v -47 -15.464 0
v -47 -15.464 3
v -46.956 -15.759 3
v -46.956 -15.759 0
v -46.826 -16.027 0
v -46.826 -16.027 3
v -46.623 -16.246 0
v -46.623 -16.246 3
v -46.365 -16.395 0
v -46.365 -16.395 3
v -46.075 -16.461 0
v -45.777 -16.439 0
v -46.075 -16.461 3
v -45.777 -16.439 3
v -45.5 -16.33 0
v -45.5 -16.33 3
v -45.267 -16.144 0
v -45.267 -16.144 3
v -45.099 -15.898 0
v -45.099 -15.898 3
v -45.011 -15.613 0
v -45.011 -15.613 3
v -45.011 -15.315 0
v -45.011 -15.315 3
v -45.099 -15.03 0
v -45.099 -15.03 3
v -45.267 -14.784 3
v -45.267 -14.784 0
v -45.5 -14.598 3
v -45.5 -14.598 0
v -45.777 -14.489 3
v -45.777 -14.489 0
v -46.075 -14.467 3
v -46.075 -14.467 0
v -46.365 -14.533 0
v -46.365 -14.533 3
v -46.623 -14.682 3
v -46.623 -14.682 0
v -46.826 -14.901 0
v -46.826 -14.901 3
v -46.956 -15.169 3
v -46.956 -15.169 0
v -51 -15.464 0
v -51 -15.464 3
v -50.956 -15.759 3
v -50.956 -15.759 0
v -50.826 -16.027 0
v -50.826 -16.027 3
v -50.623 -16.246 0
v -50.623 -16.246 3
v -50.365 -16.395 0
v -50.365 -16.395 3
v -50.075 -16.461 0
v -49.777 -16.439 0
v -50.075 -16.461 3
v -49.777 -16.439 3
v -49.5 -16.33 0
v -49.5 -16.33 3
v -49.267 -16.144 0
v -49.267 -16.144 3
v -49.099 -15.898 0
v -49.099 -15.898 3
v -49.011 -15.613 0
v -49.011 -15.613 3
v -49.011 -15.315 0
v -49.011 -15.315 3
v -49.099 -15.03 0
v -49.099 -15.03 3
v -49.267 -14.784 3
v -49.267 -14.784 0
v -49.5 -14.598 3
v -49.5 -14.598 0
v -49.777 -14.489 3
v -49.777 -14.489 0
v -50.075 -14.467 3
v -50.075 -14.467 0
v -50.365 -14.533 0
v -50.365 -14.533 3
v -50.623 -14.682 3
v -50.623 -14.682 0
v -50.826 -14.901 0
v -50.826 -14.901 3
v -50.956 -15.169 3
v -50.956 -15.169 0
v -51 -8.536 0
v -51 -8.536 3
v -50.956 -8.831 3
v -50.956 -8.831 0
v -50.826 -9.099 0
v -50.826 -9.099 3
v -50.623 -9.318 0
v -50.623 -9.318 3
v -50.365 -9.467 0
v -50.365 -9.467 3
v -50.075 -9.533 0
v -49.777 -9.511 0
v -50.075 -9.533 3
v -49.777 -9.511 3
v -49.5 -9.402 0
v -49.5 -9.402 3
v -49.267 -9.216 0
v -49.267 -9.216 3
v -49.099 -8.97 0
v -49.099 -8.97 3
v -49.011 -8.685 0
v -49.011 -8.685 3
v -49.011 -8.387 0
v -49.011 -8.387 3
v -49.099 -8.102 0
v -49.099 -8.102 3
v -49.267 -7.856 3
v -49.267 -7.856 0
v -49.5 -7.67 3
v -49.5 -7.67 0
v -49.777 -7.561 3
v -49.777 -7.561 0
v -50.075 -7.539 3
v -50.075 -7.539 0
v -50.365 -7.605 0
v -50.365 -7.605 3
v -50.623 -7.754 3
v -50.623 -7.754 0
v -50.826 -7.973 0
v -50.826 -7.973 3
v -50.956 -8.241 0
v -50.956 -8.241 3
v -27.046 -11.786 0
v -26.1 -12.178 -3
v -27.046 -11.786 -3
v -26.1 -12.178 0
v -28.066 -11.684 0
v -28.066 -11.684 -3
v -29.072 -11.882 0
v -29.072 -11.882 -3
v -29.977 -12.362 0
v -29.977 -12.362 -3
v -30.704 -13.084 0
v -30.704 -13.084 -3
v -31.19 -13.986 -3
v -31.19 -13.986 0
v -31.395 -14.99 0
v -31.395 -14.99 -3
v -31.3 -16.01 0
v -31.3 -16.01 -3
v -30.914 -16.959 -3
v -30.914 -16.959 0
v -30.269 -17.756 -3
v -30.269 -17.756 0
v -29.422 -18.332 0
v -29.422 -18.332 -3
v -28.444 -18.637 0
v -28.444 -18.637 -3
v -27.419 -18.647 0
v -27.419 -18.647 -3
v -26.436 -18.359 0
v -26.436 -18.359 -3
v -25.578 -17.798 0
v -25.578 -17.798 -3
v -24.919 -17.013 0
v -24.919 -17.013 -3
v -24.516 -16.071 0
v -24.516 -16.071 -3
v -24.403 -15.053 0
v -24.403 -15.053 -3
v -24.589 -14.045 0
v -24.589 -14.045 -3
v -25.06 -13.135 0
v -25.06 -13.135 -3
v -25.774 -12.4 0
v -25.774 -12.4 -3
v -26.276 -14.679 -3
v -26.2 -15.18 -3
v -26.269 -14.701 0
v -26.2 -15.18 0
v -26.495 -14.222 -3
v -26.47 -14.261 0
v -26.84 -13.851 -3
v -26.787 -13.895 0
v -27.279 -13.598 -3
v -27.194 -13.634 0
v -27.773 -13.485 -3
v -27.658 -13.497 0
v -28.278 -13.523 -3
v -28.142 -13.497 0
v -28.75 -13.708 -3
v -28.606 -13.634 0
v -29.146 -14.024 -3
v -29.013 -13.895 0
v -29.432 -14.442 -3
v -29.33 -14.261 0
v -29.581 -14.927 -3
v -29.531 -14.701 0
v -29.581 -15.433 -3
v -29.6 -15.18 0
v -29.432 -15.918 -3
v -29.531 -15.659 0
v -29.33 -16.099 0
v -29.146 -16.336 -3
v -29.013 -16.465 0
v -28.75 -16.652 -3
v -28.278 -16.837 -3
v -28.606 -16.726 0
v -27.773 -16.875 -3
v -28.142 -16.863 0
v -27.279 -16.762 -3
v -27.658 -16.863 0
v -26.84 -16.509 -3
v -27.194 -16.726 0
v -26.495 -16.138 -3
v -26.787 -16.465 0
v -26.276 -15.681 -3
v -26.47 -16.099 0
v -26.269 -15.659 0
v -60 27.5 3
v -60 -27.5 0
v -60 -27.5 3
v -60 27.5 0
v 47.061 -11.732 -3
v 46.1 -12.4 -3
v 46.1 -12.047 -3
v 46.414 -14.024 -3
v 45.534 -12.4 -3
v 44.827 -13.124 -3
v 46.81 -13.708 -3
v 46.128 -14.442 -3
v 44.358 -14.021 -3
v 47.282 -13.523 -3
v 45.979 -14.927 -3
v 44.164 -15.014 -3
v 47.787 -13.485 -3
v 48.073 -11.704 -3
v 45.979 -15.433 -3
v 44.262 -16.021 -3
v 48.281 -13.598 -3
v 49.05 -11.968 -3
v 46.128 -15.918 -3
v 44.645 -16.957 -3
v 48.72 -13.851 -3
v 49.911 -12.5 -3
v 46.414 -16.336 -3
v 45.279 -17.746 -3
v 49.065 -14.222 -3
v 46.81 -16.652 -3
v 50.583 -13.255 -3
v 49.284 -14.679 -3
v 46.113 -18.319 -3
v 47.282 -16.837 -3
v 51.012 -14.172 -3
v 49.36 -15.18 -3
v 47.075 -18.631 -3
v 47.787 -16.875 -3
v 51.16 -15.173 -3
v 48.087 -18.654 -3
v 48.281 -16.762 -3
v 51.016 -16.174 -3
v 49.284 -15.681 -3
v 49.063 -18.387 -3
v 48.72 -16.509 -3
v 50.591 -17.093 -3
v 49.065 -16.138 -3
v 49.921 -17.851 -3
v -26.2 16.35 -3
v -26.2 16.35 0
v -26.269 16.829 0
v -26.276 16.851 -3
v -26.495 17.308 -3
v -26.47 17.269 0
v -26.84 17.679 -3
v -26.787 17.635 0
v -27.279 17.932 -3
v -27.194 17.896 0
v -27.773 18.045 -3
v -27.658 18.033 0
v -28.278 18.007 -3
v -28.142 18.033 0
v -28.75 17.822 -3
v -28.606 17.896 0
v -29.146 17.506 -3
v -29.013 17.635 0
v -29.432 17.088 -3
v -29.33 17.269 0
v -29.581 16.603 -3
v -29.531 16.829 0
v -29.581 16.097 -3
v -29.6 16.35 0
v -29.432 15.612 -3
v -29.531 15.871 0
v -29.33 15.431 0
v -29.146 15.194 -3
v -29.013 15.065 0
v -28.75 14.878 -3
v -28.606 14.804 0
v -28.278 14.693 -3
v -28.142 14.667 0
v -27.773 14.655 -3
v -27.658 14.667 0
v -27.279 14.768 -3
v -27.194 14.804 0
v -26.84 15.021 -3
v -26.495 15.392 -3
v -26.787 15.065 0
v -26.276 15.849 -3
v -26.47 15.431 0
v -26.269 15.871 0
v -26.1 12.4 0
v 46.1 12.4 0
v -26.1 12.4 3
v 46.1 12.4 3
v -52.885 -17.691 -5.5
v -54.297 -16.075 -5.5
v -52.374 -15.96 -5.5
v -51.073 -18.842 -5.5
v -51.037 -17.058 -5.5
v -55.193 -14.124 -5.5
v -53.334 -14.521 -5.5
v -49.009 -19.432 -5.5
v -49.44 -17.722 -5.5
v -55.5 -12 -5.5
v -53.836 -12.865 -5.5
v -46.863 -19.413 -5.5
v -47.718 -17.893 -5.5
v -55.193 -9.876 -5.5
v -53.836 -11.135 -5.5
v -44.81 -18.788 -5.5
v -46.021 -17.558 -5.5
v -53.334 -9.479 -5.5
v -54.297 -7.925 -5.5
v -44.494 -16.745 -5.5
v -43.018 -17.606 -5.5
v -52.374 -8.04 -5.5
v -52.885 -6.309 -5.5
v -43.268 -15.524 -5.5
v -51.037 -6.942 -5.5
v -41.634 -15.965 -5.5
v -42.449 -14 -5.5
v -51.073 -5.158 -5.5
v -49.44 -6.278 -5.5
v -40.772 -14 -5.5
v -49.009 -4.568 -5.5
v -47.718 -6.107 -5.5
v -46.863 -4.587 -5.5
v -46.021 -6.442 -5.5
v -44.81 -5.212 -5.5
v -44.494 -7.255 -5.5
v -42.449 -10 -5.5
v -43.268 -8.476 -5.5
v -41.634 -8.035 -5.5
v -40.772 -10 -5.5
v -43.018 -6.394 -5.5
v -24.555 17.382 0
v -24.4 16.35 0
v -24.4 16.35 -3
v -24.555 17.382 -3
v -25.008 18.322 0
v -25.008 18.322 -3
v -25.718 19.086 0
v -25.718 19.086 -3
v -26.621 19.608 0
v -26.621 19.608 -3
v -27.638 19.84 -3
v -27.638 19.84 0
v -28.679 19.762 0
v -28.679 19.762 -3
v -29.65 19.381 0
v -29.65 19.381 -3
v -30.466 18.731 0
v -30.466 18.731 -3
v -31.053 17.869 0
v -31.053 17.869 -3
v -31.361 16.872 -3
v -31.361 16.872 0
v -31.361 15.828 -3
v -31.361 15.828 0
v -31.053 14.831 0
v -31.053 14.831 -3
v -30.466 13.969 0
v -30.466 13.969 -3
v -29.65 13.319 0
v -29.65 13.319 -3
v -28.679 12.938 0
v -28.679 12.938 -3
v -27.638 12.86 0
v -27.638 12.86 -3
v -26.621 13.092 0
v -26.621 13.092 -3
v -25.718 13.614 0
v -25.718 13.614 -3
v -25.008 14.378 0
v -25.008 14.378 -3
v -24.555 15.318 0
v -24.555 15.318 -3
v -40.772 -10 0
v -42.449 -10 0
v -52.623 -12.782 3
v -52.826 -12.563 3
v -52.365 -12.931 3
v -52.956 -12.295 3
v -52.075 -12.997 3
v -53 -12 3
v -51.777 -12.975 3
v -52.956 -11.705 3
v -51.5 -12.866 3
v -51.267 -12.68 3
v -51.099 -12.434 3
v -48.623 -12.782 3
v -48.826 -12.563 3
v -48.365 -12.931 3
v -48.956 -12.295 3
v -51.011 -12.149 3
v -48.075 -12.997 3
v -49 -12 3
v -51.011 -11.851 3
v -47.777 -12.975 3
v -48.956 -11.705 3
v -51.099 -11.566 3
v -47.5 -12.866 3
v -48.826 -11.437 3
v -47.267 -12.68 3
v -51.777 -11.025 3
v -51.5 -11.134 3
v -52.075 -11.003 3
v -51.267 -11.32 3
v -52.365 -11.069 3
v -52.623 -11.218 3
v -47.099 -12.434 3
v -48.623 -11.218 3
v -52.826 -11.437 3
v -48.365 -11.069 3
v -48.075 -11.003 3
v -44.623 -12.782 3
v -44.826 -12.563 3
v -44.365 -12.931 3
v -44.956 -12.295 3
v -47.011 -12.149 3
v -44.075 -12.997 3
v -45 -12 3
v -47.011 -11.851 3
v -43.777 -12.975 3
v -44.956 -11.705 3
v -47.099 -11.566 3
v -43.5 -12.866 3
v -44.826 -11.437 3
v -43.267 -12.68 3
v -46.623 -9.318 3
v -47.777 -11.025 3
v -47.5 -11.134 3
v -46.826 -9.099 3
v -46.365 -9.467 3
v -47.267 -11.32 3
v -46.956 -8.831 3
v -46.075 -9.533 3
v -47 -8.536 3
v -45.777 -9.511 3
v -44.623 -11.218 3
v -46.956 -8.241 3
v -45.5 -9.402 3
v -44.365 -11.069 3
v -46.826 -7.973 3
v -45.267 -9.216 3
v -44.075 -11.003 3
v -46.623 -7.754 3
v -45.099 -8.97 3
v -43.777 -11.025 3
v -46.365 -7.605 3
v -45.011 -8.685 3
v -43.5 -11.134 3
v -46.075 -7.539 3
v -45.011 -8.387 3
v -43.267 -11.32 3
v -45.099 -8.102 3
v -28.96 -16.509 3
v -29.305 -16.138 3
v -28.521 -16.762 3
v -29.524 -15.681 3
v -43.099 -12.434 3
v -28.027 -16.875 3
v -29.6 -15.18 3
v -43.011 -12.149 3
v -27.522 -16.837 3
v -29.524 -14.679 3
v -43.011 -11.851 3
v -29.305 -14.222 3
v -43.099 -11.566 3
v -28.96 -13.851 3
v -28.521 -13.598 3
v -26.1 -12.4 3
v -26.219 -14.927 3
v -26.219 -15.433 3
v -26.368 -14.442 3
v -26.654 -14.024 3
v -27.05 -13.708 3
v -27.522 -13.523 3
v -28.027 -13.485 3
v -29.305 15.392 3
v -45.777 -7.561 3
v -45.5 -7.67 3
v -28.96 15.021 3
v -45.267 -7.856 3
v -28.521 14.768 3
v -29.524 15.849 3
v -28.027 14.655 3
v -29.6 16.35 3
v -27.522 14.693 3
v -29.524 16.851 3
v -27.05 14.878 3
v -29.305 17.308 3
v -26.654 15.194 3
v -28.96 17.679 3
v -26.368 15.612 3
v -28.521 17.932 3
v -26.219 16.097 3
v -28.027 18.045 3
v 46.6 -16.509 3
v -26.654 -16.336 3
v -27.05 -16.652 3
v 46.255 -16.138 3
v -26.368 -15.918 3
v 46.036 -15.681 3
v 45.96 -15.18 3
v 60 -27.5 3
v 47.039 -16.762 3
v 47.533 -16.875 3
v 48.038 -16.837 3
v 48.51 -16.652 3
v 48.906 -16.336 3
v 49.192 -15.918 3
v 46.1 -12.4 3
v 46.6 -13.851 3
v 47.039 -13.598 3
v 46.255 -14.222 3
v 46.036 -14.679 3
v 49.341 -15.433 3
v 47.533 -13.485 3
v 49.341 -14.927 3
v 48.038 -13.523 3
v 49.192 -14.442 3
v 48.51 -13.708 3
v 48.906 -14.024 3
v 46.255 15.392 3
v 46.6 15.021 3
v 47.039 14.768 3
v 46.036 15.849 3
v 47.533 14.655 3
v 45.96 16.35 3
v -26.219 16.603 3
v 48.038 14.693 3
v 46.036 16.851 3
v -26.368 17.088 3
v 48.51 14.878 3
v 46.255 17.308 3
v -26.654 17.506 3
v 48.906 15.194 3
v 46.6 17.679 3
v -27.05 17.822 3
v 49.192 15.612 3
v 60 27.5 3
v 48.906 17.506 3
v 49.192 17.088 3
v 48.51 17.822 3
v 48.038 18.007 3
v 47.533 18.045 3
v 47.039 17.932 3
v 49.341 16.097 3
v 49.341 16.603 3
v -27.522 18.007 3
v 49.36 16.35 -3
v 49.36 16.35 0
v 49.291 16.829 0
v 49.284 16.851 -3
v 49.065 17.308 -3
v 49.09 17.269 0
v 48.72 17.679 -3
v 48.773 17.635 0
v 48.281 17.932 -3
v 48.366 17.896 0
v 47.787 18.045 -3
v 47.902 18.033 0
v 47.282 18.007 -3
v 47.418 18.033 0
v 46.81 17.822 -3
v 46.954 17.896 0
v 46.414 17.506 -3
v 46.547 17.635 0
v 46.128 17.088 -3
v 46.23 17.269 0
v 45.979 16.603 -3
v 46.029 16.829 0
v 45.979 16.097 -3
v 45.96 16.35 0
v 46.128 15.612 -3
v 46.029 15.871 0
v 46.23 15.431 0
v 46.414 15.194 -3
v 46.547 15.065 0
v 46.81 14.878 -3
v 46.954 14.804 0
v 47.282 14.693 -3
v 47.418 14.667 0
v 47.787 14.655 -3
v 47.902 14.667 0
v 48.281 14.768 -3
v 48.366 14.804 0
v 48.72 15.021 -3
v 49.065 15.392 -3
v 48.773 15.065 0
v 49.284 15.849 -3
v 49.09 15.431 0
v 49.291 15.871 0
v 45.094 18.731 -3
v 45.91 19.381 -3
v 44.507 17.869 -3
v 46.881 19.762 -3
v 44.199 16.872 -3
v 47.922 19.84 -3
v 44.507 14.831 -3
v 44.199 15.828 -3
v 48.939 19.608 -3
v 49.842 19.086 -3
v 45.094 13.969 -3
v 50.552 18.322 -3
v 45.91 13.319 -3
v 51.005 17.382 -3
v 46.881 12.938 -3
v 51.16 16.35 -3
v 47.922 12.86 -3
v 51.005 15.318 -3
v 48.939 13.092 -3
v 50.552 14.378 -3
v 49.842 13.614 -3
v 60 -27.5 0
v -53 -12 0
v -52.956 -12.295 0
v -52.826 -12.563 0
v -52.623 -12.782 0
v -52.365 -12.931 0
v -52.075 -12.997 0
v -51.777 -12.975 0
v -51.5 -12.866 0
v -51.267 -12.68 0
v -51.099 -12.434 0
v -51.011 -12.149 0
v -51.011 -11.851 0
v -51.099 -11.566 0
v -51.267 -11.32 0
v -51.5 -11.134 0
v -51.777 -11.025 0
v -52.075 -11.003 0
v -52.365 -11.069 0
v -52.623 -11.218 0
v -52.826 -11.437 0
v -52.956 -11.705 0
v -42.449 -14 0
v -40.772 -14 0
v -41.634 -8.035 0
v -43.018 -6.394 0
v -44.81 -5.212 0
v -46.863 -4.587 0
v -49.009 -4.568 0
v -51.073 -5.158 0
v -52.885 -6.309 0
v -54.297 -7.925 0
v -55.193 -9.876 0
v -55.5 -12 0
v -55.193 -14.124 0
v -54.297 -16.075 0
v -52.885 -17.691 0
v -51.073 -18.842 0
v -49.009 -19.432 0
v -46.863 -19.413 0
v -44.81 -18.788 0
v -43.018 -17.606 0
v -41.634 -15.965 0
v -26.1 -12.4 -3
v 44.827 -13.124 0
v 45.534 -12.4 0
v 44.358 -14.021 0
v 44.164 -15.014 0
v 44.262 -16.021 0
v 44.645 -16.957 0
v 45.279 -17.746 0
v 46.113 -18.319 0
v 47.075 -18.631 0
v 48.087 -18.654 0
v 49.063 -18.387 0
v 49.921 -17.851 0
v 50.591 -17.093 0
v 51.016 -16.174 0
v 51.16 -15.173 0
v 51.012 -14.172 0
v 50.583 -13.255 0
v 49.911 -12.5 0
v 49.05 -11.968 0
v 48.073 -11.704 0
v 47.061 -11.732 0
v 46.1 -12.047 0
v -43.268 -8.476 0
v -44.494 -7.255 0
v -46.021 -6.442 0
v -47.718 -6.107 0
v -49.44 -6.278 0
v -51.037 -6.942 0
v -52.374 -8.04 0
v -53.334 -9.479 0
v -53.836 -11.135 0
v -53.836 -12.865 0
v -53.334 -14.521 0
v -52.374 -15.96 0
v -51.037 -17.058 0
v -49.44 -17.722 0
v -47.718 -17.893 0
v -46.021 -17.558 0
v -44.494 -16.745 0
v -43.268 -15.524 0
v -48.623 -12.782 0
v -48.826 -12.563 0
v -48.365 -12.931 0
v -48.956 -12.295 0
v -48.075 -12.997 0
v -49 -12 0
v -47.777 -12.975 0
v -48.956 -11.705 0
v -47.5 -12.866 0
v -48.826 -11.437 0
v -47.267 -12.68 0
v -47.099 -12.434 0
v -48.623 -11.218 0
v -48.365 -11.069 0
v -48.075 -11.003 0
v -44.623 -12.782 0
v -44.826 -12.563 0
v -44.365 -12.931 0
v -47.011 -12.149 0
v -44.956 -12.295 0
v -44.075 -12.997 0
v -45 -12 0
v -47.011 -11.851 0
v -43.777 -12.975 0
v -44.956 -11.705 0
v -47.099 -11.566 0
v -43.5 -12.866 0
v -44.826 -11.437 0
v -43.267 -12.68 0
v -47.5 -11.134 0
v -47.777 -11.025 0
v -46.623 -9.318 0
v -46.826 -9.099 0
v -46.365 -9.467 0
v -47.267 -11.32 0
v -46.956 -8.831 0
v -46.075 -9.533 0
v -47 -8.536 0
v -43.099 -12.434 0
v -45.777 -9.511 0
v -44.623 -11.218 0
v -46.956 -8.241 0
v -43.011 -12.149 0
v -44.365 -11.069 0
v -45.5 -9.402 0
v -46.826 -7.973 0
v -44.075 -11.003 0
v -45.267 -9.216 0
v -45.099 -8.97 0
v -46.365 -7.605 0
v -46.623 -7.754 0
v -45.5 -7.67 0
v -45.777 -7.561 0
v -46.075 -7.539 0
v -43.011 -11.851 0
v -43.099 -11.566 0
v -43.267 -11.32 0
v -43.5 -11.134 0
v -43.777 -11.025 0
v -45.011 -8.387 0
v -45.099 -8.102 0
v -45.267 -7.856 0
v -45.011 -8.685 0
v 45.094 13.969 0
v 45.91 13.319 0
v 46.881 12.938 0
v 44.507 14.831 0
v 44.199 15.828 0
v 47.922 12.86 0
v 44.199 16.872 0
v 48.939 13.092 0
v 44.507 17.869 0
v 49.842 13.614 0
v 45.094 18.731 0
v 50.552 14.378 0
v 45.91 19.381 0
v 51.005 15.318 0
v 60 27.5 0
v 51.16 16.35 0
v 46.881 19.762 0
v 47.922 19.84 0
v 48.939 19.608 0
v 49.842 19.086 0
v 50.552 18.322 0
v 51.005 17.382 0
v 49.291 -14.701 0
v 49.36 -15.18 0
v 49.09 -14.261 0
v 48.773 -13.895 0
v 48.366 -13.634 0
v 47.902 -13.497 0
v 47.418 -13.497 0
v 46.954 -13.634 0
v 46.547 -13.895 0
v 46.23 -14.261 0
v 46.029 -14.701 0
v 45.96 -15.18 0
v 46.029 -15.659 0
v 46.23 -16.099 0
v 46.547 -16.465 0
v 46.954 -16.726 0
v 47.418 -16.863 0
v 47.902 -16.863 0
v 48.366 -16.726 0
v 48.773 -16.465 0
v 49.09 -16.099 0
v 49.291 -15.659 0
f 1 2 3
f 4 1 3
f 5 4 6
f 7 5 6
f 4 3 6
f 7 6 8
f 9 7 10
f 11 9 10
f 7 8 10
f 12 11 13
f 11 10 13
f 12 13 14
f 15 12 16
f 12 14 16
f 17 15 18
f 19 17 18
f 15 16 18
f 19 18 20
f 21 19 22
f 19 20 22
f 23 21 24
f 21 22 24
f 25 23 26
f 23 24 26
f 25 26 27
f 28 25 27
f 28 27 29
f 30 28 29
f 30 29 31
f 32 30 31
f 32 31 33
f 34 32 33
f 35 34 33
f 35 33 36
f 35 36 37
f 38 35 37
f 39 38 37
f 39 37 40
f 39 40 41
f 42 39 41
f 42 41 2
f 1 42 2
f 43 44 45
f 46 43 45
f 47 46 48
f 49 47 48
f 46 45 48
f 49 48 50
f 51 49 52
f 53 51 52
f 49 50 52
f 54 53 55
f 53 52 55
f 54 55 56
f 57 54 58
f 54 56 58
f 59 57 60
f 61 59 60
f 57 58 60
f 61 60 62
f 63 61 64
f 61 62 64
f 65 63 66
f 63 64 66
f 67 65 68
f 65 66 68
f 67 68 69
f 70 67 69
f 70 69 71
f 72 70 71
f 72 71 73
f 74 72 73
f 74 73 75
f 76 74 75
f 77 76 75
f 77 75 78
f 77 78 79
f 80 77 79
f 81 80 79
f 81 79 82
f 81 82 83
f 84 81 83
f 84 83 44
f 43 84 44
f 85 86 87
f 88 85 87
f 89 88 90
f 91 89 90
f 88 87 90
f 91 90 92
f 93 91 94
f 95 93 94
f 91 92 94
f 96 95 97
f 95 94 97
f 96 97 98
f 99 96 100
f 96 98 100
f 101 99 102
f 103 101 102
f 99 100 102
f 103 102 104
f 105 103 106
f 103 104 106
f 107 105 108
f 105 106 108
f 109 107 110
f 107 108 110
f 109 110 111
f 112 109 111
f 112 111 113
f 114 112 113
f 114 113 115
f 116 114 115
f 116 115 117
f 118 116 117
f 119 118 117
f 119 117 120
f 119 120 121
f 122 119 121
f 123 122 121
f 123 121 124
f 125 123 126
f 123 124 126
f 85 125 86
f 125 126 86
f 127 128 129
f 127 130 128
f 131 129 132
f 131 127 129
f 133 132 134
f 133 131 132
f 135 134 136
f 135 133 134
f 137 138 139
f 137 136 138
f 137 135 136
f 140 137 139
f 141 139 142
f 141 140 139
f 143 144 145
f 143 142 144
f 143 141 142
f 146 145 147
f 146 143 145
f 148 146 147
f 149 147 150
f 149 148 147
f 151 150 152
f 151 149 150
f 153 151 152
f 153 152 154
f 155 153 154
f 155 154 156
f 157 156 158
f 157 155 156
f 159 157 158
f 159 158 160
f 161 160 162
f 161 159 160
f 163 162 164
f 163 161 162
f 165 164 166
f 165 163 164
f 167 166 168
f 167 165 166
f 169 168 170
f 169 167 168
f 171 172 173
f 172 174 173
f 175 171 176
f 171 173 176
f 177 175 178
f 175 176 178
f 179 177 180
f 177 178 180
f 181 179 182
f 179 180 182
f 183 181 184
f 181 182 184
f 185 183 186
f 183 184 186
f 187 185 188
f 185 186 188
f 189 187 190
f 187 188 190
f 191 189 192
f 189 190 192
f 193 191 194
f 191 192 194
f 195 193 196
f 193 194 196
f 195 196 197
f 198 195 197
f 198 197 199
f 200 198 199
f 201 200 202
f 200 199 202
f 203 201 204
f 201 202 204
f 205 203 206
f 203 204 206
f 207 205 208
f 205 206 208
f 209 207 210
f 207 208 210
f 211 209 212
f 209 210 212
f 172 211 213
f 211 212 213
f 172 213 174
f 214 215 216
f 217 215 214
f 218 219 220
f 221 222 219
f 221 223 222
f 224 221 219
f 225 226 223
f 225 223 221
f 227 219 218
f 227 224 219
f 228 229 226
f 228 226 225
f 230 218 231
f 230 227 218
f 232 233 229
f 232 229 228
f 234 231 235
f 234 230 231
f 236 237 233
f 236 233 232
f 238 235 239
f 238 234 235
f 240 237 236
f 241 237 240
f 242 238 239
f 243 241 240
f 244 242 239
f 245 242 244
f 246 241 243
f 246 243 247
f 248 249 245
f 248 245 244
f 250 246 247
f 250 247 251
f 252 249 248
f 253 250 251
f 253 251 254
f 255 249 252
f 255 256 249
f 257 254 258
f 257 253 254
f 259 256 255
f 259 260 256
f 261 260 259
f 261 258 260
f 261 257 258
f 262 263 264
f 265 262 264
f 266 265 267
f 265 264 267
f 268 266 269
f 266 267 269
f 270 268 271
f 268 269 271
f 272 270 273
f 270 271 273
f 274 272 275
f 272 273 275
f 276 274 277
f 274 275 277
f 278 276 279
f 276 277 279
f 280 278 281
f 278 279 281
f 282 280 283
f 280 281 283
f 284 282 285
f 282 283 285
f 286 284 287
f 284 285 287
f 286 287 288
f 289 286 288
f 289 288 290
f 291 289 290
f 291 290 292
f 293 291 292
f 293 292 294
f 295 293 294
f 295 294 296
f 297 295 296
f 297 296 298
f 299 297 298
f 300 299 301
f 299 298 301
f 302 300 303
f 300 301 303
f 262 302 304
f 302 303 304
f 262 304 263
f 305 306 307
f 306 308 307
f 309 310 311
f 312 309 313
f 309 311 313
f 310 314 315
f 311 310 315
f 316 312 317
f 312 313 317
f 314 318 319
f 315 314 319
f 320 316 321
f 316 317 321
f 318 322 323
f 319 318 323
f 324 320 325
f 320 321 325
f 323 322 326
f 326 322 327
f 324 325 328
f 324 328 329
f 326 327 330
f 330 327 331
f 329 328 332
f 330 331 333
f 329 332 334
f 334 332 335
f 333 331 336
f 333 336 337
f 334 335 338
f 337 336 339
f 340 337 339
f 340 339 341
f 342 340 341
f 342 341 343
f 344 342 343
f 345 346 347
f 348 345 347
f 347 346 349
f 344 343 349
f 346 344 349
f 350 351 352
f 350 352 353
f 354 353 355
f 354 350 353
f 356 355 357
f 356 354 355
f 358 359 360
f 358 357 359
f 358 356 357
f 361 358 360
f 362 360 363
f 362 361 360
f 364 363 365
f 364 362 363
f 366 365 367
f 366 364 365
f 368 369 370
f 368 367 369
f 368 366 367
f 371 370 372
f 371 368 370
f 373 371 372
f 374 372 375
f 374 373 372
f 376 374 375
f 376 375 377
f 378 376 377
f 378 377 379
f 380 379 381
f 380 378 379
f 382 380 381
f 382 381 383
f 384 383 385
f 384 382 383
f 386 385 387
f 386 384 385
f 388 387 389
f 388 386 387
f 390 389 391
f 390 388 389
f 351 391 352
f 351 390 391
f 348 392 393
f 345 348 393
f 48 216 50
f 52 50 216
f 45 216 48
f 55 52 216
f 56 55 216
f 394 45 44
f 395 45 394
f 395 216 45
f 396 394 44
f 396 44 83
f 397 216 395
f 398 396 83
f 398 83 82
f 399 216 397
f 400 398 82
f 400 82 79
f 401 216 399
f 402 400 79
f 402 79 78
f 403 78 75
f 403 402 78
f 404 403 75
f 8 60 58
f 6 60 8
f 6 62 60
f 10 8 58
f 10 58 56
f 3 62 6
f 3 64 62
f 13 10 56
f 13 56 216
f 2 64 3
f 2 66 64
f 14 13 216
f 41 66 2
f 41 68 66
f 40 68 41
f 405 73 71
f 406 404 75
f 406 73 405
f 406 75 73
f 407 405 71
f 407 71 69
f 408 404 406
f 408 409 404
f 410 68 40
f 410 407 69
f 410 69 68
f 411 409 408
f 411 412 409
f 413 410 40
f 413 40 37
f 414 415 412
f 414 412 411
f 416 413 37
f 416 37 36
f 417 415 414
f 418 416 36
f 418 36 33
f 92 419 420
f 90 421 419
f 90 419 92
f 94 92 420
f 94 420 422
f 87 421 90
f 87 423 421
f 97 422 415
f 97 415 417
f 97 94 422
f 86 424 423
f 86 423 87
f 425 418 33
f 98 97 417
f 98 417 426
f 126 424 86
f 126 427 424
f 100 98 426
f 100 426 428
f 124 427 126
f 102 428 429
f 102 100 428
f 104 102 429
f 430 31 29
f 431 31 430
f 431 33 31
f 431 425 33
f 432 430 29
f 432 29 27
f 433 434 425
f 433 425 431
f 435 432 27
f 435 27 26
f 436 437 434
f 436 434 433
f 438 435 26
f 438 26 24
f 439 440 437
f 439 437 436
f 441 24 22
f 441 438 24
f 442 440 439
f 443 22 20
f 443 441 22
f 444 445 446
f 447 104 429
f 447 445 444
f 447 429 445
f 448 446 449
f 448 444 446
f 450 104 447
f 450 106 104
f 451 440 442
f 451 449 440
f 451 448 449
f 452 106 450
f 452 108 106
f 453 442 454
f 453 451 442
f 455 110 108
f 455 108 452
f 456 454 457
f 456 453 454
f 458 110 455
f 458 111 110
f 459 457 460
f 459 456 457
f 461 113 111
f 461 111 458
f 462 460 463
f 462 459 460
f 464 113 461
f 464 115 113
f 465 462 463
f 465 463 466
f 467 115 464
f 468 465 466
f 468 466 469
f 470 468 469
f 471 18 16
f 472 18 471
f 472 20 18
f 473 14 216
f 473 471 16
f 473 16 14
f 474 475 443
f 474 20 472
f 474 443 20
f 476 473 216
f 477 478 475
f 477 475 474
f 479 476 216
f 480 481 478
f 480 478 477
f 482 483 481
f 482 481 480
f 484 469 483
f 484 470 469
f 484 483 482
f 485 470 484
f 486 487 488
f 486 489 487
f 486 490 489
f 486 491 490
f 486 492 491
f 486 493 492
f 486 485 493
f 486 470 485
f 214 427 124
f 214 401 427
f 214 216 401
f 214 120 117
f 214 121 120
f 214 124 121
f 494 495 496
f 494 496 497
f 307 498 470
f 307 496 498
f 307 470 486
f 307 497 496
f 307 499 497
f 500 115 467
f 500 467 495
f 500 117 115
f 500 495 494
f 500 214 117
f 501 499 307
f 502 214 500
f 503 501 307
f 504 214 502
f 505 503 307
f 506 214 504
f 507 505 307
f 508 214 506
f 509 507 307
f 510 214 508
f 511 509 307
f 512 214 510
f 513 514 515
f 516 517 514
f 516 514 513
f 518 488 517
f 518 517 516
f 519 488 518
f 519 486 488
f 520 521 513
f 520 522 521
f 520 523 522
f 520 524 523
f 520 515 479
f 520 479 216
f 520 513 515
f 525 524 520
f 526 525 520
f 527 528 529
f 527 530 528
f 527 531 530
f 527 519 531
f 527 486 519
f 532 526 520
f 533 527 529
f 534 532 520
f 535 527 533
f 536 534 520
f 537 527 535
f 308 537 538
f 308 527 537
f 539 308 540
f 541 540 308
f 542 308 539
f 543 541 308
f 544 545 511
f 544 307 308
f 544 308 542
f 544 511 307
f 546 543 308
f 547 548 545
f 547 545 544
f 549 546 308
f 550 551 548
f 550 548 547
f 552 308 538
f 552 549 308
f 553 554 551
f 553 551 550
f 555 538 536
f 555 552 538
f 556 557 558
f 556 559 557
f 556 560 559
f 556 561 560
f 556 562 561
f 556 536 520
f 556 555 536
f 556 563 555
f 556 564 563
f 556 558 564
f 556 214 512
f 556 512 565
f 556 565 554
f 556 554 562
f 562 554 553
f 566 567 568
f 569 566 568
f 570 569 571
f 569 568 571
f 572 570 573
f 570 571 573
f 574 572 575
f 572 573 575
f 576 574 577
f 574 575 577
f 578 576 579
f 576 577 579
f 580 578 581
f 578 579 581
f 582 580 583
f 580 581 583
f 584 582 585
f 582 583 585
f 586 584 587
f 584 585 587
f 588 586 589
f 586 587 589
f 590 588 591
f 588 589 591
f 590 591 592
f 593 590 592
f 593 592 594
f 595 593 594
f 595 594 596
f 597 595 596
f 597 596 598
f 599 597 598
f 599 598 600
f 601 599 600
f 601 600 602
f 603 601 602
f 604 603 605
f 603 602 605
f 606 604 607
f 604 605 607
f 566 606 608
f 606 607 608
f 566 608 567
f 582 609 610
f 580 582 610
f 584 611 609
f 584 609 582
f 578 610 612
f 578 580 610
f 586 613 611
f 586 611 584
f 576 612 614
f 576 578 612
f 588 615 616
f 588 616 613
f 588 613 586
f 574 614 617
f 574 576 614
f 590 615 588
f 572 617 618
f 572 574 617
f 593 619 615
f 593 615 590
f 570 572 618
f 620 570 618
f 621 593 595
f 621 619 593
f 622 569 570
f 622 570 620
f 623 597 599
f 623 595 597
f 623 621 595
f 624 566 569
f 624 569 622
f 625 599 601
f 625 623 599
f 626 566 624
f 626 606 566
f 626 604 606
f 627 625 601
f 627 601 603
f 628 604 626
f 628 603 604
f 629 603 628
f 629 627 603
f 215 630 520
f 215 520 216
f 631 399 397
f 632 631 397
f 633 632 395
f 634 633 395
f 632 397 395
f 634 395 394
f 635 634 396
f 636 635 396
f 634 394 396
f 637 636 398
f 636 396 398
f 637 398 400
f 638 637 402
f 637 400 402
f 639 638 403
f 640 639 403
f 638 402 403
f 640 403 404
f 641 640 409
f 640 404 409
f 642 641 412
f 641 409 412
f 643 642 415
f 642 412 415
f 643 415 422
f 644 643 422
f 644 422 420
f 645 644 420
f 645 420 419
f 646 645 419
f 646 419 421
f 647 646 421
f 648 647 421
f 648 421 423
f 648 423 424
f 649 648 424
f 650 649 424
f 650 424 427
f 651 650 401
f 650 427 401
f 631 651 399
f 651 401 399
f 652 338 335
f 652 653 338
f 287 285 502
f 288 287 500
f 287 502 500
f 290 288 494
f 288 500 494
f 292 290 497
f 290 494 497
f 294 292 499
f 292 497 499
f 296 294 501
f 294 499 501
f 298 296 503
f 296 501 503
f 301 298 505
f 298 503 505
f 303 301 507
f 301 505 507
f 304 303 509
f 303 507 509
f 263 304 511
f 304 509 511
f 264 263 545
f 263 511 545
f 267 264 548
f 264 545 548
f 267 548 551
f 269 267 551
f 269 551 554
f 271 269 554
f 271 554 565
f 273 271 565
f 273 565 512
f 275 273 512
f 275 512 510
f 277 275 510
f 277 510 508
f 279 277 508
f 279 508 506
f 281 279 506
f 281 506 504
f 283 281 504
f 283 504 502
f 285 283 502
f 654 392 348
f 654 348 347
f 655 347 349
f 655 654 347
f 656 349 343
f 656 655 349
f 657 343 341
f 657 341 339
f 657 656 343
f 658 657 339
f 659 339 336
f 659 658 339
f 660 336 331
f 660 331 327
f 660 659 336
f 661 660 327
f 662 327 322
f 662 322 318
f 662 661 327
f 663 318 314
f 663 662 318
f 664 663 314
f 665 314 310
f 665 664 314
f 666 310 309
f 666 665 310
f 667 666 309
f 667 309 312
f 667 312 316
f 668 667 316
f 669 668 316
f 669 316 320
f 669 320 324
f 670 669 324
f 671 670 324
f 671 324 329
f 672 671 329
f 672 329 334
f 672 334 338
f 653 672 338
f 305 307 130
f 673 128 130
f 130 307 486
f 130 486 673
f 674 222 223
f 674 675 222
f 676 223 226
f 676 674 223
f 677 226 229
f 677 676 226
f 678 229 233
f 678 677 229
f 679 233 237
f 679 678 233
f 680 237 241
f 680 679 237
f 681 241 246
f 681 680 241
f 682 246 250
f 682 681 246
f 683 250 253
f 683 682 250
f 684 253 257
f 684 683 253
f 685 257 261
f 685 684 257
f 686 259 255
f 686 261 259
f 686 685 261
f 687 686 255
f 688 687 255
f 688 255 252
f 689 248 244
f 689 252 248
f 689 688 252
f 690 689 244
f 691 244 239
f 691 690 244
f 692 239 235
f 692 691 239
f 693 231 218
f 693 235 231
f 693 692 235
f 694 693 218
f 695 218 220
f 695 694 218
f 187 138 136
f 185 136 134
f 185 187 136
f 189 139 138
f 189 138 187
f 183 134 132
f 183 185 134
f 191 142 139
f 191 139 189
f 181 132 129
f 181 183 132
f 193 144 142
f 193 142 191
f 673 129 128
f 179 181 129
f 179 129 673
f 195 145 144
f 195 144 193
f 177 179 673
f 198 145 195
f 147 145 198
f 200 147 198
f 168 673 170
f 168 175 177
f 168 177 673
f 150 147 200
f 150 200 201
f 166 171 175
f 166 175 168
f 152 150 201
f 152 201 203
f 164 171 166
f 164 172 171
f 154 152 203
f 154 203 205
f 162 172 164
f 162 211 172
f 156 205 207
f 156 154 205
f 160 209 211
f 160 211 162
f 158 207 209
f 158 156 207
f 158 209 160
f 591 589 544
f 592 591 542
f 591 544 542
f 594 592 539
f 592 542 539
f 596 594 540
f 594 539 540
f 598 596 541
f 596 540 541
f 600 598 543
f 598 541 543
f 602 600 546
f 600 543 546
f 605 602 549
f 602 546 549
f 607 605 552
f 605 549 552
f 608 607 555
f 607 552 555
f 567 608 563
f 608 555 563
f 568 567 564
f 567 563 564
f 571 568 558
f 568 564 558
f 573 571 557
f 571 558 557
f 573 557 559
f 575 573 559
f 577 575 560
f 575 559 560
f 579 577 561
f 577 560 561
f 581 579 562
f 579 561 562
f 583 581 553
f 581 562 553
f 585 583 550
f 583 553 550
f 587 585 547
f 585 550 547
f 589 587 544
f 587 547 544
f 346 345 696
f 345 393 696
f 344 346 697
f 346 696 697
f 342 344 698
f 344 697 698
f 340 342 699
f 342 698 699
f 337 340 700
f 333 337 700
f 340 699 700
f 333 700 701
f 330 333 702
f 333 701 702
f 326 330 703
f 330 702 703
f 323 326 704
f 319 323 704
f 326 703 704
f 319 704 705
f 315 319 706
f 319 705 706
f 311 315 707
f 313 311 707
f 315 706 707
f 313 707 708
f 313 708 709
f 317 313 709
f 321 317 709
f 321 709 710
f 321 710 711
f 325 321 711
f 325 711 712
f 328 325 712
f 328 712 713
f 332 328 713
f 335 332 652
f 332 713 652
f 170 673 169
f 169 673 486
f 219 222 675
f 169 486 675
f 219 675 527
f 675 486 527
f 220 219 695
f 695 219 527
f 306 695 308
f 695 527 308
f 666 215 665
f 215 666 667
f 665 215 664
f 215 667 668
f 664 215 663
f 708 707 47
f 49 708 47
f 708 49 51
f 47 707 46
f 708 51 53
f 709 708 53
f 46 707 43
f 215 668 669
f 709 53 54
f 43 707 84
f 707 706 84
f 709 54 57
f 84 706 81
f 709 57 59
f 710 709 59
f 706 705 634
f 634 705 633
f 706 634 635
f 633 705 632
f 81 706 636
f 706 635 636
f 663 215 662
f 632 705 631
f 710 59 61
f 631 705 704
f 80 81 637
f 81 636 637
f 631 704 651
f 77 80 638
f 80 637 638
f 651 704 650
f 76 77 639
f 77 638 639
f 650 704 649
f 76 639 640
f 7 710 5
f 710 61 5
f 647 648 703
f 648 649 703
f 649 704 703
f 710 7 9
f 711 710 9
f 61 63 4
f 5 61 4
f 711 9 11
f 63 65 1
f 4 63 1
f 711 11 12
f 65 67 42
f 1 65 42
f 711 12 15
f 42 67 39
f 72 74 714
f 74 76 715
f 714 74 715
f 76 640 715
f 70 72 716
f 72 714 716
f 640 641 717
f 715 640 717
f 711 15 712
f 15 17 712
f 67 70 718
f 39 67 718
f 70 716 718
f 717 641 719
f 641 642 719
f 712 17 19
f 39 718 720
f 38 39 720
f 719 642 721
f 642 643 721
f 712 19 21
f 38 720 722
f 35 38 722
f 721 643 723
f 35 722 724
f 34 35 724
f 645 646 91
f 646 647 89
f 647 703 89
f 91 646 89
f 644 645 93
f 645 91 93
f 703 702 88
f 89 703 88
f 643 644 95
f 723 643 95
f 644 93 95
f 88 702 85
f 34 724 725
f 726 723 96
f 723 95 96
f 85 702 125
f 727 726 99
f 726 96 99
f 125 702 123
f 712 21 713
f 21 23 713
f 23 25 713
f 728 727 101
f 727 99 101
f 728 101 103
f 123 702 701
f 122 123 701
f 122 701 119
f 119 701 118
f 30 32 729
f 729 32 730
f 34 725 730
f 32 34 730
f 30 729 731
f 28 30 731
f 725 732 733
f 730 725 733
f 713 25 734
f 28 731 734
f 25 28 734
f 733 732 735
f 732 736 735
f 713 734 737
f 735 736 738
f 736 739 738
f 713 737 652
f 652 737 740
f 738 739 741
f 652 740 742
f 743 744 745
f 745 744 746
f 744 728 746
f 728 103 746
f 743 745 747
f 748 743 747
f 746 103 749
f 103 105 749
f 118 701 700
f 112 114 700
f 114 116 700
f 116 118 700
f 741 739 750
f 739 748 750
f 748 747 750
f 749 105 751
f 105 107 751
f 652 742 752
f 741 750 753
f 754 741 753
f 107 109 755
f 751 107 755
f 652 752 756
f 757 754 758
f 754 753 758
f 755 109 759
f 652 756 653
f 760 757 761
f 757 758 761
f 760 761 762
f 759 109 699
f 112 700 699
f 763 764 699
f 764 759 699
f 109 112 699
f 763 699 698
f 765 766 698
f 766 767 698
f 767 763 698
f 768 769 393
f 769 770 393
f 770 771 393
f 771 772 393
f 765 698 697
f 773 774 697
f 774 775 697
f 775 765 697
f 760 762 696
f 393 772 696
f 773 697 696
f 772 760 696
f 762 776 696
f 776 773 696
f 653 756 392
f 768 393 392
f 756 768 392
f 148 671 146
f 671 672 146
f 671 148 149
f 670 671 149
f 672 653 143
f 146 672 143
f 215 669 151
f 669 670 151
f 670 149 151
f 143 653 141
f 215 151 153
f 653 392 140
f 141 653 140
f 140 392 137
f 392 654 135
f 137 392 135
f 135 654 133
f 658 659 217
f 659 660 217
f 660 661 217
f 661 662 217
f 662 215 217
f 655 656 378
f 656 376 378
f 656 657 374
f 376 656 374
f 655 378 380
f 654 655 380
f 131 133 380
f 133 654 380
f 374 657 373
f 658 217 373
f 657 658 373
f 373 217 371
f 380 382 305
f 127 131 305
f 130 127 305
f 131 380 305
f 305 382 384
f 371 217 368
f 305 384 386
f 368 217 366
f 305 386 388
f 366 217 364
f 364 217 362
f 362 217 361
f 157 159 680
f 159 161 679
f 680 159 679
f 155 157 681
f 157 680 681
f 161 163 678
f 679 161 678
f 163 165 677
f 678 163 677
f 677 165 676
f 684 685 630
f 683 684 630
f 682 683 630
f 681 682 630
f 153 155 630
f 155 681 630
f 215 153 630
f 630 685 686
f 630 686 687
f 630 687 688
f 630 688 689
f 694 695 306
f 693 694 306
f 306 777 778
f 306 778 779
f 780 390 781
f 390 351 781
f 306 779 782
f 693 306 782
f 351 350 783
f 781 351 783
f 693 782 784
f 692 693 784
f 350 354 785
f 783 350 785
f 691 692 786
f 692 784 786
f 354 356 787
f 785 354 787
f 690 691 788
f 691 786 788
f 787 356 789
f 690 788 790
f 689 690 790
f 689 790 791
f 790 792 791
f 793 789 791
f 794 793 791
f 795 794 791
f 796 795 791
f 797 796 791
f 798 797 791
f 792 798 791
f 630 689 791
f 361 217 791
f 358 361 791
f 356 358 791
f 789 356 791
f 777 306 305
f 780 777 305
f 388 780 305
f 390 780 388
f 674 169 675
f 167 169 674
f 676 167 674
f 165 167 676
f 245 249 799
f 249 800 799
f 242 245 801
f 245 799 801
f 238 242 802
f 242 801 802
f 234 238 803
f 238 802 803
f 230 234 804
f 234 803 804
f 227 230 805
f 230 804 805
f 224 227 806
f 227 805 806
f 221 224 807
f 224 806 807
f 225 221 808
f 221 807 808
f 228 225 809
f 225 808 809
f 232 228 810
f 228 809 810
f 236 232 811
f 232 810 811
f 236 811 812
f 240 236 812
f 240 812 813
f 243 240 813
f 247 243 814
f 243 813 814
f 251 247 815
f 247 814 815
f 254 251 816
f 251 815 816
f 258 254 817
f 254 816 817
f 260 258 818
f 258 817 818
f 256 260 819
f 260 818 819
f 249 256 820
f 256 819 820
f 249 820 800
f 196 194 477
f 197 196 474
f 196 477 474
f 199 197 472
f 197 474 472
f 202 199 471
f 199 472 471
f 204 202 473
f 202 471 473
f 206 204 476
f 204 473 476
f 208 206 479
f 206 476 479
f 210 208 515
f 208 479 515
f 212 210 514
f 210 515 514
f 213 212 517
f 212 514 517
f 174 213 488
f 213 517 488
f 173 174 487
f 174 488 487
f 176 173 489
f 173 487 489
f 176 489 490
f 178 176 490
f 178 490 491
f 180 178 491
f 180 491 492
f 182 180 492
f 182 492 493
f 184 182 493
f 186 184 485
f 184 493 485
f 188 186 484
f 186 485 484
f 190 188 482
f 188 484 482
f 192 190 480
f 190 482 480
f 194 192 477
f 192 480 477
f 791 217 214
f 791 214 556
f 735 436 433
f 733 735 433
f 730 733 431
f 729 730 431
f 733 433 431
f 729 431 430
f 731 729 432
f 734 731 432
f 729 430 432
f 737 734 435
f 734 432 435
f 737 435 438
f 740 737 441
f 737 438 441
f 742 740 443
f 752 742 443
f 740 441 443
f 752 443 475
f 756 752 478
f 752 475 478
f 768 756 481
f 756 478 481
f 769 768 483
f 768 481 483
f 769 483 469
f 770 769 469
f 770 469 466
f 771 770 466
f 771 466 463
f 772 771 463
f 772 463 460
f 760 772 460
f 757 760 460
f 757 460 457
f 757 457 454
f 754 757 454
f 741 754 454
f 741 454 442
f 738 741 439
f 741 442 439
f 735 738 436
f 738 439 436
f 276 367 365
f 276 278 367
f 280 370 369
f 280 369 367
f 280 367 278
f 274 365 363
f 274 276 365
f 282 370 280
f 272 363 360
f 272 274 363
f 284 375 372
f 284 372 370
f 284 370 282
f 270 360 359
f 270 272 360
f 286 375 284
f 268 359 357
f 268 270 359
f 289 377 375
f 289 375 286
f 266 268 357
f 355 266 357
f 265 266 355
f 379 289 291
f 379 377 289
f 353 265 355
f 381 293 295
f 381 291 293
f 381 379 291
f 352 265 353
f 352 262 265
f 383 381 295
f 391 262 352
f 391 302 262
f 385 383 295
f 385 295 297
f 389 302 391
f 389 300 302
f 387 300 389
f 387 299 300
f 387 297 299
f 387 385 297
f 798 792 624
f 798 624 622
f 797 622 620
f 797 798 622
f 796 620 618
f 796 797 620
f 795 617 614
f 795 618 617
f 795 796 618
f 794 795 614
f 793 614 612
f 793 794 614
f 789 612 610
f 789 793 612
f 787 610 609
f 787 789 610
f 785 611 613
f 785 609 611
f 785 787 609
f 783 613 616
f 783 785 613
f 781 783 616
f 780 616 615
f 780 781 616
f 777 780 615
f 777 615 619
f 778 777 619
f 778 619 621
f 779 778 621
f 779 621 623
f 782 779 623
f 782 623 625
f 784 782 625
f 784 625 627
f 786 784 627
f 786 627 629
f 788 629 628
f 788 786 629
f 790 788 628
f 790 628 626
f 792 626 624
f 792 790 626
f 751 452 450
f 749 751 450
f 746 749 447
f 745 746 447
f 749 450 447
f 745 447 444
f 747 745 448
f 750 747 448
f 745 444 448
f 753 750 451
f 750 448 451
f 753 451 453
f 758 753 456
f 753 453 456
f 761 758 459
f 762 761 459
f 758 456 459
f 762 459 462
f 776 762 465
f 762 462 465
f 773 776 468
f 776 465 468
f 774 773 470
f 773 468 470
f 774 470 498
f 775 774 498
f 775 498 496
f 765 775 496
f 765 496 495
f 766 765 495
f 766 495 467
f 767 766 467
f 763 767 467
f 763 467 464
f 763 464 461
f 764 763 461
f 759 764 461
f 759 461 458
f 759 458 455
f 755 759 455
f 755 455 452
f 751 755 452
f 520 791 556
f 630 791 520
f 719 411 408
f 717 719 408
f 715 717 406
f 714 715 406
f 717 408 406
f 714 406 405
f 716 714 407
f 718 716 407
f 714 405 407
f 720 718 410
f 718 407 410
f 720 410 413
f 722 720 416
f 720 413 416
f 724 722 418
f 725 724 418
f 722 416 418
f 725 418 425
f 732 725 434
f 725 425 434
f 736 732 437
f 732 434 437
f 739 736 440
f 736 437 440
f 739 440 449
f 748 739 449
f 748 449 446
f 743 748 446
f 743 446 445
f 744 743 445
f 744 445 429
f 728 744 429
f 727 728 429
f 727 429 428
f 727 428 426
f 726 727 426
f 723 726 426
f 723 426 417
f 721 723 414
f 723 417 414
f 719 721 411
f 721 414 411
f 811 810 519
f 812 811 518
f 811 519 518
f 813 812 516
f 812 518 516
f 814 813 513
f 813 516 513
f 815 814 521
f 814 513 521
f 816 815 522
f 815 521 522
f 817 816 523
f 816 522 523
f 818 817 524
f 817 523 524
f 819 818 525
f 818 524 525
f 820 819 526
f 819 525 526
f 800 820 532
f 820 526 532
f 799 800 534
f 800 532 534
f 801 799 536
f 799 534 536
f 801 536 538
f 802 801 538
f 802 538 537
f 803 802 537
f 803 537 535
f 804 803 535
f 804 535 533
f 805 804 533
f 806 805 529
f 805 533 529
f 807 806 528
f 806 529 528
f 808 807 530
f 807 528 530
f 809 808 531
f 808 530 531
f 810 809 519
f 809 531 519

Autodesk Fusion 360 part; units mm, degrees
sketch "Sketch1" plane through (0, 0, 0) normal (0, 0, 1) x (1, 0, 0)
  line L0 (60, -27.5) -> (-60, -27.5)
  line L1 (-60, -27.5) -> (-60, 27.5)
  line L2 (-60, 27.5) -> (60, 27.5)
  line L3 (60, 27.5) -> (60, -27.5)
  line L4 (60, -27.5) -> (-60, 27.5) construction
  line L5 (-60, -27.5) -> (60, 27.5) construction
  dimension "d1" = 120
  dimension "d2" = 55
extrude "Extrude1" add sketch "Sketch1" along normal blind 3
sketch "Sketch2" plane through (0, 0, 3) normal (0, 0, 1) x (-1, 0, 0)
  line L0 (-60, -27.5) -> (60, -27.5)
  line L1 (60, -27.5) -> (60, 27.5)
  line L2 (60, 27.5) -> (-60, 27.5)
  line L3 (-60, 27.5) -> (-60, -27.5)
  line L4 (26.1, 12.4) -> (-46.1, 12.4)
  line L5 (-46.1, 12.4) -> (-46.1, -12.4)
  line L6 (-46.1, -12.4) -> (26.1, -12.4)
  line L7 (26.1, -12.4) -> (26.1, 12.4)
  line L8 (26.1, 12.4) -> (-46.1, -12.4) construction
  line L9 (-46.1, 12.4) -> (26.1, -12.4) construction
  point P0 (-10, 0)
  dimension "d5" = 72.2
  dimension "d6" = 24.8
extrude "Extrude2" cut sketch "Sketch2" against normal through all contours L4 L5 L6 L7
sketch "Sketch3" plane through (0, 0, 3) normal (0, 0, 1) x (-1, 0, 0)
  line L0 (26.1, -12.4) -> (-46.1, -12.4)
  line L1 (-46.1, -12.4) -> (-46.1, 12.4)
  line L2 (-46.1, 12.4) -> (26.1, 12.4)
  line L3 (26.1, 12.4) -> (26.1, -12.4)
  line L4 (-60, -27.5) -> (60, -27.5)
  line L5 (60, -27.5) -> (60, 27.5)
  line L6 (60, 27.5) -> (-60, 27.5)
  line L7 (-60, 27.5) -> (-60, -27.5)
  circle A0 centre (27.9, -16.35) radius 1.7
  circle A1 centre (-47.66, -16.35) radius 1.7
  circle A2 centre (27.9, 15.18) radius 1.7
  circle A3 centre (-47.66, 15.18) radius 1.7
  dimension "d9" = 3.4
  dimension "d10" = 27.9
  dimension "d11" = 16.35
  dimension "d14" = 75.56
  dimension "d15" = -31.53
extrude "Extrude3" cut sketch "Sketch3" against normal through all contours A0 | A1 | A2 | A3
sketch "Sketch5" plane through (0, 0, 3) normal (0, 0, 1) x (-1, 0, 0)
  circle A0 centre (-47.66, 15.18) radius 1.7
  circle A1 centre (27.9, 15.18) radius 1.7
  circle A2 centre (27.9, -16.35) radius 1.7
  circle A3 centre (-47.66, -16.35) radius 1.7
  line L0 (26.1, -12.4) -> (-46.1, -12.4)
  line L1 (-46.1, -12.4) -> (-46.1, 12.4)
  line L2 (-46.1, 12.4) -> (26.1, 12.4)
  line L3 (26.1, 12.4) -> (26.1, -12.4)
  line L4 (-60, -27.5) -> (60, -27.5)
  line L5 (60, -27.5) -> (60, 27.5)
  line L6 (60, 27.5) -> (-60, 27.5)
  line L7 (-60, 27.5) -> (-60, -27.5)
  line L8 (56.1021, -14.9687) -> (33, -15) construction
  line L9 (33, -15) -> (33.013, -24.5594) construction
  line L10 (33.013, -24.5594) -> (56.1151, -24.5281) construction
  line L11 (56.1151, -24.5281) -> (56.1021, -14.9687) construction
  dimension "d24" = 3.5
sketch "Sketch6" plane through (0, 0, 3) normal (0, 0, 1) x (-1, 0, 0)
  line L0 (-60, -27.5) -> (60, -27.5)
  line L1 (60, -27.5) -> (60, 27.5)
  line L2 (60, 27.5) -> (-60, 27.5)
  line L3 (-60, 27.5) -> (-60, -27.5)
  line L4 (26.1, -12.4) -> (-46.1, -12.4)
  line L5 (-46.1, -12.4) -> (-46.1, 12.4)
  line L6 (-46.1, 12.4) -> (26.1, 12.4)
  line L7 (26.1, 12.4) -> (26.1, -12.4)
  circle A0 centre (-47.66, -16.35) radius 1.7
  circle A1 centre (27.9, -16.35) radius 1.7
  circle A2 centre (27.9, 15.18) radius 1.7
  circle A3 centre (-47.66, 15.18) radius 1.7
  circle A4 centre (48, 12) radius 1
  circle A5 centre (44, 12) radius 1
  circle A6 centre (46, 8.5359) radius 1
  circle A7 centre (50, 8.5359) radius 1
  circle A8 centre (52, 12) radius 1
  circle A9 centre (50, 15.4641) radius 1
  circle A10 centre (46, 15.4641) radius 1
  dimension "d29" = 2
  dimension "d30" = 48
  dimension "d31" = 12
  dimension "d32" = 2
  dimension "d33" = 4
  dimension "d35" = 360
extrude "Extrude6" cut sketch "Sketch6" against normal through all contours A4 | A5 | A6 | A7 | A8 | A9 | A10
sketch "Sketch7" plane through (0, 0, 0) normal (0, 0, 1) x (1, 0, 0)
  arc A0 (-40.7716, -10) -> (-40.7716, -14) centre (-48, -12) ccw
  arc A1 (-42.4493, -10) -> (-42.4493, -14) centre (-48, -12) ccw
  line L0 (-40.7716, -10) -> (-42.4493, -10)
  line L1 (-40.7716, -14) -> (-42.4493, -14)
  dimension "d37" = 11.8
  dimension "d38" = 48
  dimension "d39" = 12
  dimension "d40" = 15
  dimension "d41" = 2
  dimension "d42" = 2
extrude "Extrude7" add sketch "Sketch7" against normal blind 5.5
sketch "Sketch8" plane through (0, 0, 0) normal (0, 0, -1) x (1, 0, 0)
  circle A0 centre (-46, 15.4641) radius 1
  circle A1 centre (-48, 12) radius 1
  circle A2 centre (-50, 15.4641) radius 1
  circle A3 centre (-44, 12) radius 1
  circle A4 centre (-50, 8.5359) radius 1
  circle A5 centre (-52, 12) radius 1
  circle A6 centre (-46, 8.5359) radius 1
  line L0 (-60, -27.5) -> (60, -27.5)
  line L1 (60, -27.5) -> (60, 27.5)
  line L2 (60, 27.5) -> (-60, 27.5)
  line L3 (-60, 27.5) -> (-60, -27.5)
  line L4 (46.1, -12.4) -> (-26.1, -12.4)
  line L5 (-26.1, -12.4) -> (-26.1, 12.4)
  line L6 (-26.1, 12.4) -> (46.1, 12.4)
  line L7 (46.1, 12.4) -> (46.1, -12.4)
  circle A7 centre (47.66, -16.35) radius 1.7
  circle A8 centre (-27.9, -16.35) radius 1.7
  circle A9 centre (-27.9, 15.18) radius 1.7
  circle A10 centre (47.66, 15.18) radius 1.7
  line L8 (-40.7716, 14) -> (-42.4493, 14)
  arc A11 (-42.4493, 14) -> (-42.4493, 10) centre (-48, 12) ccw
  line L9 (-42.4493, 10) -> (-40.7716, 10)
  arc A12 (-40.7716, 14) -> (-40.7716, 10) centre (-48, 12) ccw
  circle A13 centre (47.66, -16.35) radius 1.7
  circle A14 centre (-27.9, -16.35) radius 1.7
  circle A15 centre (-27.9, 15.18) radius 1.7
  circle A16 centre (47.66, 15.18) radius 1.7
  circle A17 centre (47.66, -16.35) radius 3.5
  circle A18 centre (-27.9, -16.35) radius 3.5
  arc A19 (46.1, 12.0469) -> (45.5336, 12.4) centre (47.66, 15.18) ccw
  arc A20 (-25.7736, 12.4) -> (-26.1, 12.1783) centre (-27.9, 15.18) ccw
  point P0 (46.1, 12.4)
  point P1 (46.1, -12.4)
  point P2 (-26.1, -12.4)
  point P3 (-26.1, 12.4)
  dimension "d45" = 7
  dimension "d46" = 7
  dimension "d47" = 7
  dimension "d48" = 7
extrude "Extrude8" add sketch "Sketch8" along normal blind 3 contours L6 L7 A19 | L5 L6 A20 | A17 | A18
equation "d25 = 'Teo larmklocka'"
